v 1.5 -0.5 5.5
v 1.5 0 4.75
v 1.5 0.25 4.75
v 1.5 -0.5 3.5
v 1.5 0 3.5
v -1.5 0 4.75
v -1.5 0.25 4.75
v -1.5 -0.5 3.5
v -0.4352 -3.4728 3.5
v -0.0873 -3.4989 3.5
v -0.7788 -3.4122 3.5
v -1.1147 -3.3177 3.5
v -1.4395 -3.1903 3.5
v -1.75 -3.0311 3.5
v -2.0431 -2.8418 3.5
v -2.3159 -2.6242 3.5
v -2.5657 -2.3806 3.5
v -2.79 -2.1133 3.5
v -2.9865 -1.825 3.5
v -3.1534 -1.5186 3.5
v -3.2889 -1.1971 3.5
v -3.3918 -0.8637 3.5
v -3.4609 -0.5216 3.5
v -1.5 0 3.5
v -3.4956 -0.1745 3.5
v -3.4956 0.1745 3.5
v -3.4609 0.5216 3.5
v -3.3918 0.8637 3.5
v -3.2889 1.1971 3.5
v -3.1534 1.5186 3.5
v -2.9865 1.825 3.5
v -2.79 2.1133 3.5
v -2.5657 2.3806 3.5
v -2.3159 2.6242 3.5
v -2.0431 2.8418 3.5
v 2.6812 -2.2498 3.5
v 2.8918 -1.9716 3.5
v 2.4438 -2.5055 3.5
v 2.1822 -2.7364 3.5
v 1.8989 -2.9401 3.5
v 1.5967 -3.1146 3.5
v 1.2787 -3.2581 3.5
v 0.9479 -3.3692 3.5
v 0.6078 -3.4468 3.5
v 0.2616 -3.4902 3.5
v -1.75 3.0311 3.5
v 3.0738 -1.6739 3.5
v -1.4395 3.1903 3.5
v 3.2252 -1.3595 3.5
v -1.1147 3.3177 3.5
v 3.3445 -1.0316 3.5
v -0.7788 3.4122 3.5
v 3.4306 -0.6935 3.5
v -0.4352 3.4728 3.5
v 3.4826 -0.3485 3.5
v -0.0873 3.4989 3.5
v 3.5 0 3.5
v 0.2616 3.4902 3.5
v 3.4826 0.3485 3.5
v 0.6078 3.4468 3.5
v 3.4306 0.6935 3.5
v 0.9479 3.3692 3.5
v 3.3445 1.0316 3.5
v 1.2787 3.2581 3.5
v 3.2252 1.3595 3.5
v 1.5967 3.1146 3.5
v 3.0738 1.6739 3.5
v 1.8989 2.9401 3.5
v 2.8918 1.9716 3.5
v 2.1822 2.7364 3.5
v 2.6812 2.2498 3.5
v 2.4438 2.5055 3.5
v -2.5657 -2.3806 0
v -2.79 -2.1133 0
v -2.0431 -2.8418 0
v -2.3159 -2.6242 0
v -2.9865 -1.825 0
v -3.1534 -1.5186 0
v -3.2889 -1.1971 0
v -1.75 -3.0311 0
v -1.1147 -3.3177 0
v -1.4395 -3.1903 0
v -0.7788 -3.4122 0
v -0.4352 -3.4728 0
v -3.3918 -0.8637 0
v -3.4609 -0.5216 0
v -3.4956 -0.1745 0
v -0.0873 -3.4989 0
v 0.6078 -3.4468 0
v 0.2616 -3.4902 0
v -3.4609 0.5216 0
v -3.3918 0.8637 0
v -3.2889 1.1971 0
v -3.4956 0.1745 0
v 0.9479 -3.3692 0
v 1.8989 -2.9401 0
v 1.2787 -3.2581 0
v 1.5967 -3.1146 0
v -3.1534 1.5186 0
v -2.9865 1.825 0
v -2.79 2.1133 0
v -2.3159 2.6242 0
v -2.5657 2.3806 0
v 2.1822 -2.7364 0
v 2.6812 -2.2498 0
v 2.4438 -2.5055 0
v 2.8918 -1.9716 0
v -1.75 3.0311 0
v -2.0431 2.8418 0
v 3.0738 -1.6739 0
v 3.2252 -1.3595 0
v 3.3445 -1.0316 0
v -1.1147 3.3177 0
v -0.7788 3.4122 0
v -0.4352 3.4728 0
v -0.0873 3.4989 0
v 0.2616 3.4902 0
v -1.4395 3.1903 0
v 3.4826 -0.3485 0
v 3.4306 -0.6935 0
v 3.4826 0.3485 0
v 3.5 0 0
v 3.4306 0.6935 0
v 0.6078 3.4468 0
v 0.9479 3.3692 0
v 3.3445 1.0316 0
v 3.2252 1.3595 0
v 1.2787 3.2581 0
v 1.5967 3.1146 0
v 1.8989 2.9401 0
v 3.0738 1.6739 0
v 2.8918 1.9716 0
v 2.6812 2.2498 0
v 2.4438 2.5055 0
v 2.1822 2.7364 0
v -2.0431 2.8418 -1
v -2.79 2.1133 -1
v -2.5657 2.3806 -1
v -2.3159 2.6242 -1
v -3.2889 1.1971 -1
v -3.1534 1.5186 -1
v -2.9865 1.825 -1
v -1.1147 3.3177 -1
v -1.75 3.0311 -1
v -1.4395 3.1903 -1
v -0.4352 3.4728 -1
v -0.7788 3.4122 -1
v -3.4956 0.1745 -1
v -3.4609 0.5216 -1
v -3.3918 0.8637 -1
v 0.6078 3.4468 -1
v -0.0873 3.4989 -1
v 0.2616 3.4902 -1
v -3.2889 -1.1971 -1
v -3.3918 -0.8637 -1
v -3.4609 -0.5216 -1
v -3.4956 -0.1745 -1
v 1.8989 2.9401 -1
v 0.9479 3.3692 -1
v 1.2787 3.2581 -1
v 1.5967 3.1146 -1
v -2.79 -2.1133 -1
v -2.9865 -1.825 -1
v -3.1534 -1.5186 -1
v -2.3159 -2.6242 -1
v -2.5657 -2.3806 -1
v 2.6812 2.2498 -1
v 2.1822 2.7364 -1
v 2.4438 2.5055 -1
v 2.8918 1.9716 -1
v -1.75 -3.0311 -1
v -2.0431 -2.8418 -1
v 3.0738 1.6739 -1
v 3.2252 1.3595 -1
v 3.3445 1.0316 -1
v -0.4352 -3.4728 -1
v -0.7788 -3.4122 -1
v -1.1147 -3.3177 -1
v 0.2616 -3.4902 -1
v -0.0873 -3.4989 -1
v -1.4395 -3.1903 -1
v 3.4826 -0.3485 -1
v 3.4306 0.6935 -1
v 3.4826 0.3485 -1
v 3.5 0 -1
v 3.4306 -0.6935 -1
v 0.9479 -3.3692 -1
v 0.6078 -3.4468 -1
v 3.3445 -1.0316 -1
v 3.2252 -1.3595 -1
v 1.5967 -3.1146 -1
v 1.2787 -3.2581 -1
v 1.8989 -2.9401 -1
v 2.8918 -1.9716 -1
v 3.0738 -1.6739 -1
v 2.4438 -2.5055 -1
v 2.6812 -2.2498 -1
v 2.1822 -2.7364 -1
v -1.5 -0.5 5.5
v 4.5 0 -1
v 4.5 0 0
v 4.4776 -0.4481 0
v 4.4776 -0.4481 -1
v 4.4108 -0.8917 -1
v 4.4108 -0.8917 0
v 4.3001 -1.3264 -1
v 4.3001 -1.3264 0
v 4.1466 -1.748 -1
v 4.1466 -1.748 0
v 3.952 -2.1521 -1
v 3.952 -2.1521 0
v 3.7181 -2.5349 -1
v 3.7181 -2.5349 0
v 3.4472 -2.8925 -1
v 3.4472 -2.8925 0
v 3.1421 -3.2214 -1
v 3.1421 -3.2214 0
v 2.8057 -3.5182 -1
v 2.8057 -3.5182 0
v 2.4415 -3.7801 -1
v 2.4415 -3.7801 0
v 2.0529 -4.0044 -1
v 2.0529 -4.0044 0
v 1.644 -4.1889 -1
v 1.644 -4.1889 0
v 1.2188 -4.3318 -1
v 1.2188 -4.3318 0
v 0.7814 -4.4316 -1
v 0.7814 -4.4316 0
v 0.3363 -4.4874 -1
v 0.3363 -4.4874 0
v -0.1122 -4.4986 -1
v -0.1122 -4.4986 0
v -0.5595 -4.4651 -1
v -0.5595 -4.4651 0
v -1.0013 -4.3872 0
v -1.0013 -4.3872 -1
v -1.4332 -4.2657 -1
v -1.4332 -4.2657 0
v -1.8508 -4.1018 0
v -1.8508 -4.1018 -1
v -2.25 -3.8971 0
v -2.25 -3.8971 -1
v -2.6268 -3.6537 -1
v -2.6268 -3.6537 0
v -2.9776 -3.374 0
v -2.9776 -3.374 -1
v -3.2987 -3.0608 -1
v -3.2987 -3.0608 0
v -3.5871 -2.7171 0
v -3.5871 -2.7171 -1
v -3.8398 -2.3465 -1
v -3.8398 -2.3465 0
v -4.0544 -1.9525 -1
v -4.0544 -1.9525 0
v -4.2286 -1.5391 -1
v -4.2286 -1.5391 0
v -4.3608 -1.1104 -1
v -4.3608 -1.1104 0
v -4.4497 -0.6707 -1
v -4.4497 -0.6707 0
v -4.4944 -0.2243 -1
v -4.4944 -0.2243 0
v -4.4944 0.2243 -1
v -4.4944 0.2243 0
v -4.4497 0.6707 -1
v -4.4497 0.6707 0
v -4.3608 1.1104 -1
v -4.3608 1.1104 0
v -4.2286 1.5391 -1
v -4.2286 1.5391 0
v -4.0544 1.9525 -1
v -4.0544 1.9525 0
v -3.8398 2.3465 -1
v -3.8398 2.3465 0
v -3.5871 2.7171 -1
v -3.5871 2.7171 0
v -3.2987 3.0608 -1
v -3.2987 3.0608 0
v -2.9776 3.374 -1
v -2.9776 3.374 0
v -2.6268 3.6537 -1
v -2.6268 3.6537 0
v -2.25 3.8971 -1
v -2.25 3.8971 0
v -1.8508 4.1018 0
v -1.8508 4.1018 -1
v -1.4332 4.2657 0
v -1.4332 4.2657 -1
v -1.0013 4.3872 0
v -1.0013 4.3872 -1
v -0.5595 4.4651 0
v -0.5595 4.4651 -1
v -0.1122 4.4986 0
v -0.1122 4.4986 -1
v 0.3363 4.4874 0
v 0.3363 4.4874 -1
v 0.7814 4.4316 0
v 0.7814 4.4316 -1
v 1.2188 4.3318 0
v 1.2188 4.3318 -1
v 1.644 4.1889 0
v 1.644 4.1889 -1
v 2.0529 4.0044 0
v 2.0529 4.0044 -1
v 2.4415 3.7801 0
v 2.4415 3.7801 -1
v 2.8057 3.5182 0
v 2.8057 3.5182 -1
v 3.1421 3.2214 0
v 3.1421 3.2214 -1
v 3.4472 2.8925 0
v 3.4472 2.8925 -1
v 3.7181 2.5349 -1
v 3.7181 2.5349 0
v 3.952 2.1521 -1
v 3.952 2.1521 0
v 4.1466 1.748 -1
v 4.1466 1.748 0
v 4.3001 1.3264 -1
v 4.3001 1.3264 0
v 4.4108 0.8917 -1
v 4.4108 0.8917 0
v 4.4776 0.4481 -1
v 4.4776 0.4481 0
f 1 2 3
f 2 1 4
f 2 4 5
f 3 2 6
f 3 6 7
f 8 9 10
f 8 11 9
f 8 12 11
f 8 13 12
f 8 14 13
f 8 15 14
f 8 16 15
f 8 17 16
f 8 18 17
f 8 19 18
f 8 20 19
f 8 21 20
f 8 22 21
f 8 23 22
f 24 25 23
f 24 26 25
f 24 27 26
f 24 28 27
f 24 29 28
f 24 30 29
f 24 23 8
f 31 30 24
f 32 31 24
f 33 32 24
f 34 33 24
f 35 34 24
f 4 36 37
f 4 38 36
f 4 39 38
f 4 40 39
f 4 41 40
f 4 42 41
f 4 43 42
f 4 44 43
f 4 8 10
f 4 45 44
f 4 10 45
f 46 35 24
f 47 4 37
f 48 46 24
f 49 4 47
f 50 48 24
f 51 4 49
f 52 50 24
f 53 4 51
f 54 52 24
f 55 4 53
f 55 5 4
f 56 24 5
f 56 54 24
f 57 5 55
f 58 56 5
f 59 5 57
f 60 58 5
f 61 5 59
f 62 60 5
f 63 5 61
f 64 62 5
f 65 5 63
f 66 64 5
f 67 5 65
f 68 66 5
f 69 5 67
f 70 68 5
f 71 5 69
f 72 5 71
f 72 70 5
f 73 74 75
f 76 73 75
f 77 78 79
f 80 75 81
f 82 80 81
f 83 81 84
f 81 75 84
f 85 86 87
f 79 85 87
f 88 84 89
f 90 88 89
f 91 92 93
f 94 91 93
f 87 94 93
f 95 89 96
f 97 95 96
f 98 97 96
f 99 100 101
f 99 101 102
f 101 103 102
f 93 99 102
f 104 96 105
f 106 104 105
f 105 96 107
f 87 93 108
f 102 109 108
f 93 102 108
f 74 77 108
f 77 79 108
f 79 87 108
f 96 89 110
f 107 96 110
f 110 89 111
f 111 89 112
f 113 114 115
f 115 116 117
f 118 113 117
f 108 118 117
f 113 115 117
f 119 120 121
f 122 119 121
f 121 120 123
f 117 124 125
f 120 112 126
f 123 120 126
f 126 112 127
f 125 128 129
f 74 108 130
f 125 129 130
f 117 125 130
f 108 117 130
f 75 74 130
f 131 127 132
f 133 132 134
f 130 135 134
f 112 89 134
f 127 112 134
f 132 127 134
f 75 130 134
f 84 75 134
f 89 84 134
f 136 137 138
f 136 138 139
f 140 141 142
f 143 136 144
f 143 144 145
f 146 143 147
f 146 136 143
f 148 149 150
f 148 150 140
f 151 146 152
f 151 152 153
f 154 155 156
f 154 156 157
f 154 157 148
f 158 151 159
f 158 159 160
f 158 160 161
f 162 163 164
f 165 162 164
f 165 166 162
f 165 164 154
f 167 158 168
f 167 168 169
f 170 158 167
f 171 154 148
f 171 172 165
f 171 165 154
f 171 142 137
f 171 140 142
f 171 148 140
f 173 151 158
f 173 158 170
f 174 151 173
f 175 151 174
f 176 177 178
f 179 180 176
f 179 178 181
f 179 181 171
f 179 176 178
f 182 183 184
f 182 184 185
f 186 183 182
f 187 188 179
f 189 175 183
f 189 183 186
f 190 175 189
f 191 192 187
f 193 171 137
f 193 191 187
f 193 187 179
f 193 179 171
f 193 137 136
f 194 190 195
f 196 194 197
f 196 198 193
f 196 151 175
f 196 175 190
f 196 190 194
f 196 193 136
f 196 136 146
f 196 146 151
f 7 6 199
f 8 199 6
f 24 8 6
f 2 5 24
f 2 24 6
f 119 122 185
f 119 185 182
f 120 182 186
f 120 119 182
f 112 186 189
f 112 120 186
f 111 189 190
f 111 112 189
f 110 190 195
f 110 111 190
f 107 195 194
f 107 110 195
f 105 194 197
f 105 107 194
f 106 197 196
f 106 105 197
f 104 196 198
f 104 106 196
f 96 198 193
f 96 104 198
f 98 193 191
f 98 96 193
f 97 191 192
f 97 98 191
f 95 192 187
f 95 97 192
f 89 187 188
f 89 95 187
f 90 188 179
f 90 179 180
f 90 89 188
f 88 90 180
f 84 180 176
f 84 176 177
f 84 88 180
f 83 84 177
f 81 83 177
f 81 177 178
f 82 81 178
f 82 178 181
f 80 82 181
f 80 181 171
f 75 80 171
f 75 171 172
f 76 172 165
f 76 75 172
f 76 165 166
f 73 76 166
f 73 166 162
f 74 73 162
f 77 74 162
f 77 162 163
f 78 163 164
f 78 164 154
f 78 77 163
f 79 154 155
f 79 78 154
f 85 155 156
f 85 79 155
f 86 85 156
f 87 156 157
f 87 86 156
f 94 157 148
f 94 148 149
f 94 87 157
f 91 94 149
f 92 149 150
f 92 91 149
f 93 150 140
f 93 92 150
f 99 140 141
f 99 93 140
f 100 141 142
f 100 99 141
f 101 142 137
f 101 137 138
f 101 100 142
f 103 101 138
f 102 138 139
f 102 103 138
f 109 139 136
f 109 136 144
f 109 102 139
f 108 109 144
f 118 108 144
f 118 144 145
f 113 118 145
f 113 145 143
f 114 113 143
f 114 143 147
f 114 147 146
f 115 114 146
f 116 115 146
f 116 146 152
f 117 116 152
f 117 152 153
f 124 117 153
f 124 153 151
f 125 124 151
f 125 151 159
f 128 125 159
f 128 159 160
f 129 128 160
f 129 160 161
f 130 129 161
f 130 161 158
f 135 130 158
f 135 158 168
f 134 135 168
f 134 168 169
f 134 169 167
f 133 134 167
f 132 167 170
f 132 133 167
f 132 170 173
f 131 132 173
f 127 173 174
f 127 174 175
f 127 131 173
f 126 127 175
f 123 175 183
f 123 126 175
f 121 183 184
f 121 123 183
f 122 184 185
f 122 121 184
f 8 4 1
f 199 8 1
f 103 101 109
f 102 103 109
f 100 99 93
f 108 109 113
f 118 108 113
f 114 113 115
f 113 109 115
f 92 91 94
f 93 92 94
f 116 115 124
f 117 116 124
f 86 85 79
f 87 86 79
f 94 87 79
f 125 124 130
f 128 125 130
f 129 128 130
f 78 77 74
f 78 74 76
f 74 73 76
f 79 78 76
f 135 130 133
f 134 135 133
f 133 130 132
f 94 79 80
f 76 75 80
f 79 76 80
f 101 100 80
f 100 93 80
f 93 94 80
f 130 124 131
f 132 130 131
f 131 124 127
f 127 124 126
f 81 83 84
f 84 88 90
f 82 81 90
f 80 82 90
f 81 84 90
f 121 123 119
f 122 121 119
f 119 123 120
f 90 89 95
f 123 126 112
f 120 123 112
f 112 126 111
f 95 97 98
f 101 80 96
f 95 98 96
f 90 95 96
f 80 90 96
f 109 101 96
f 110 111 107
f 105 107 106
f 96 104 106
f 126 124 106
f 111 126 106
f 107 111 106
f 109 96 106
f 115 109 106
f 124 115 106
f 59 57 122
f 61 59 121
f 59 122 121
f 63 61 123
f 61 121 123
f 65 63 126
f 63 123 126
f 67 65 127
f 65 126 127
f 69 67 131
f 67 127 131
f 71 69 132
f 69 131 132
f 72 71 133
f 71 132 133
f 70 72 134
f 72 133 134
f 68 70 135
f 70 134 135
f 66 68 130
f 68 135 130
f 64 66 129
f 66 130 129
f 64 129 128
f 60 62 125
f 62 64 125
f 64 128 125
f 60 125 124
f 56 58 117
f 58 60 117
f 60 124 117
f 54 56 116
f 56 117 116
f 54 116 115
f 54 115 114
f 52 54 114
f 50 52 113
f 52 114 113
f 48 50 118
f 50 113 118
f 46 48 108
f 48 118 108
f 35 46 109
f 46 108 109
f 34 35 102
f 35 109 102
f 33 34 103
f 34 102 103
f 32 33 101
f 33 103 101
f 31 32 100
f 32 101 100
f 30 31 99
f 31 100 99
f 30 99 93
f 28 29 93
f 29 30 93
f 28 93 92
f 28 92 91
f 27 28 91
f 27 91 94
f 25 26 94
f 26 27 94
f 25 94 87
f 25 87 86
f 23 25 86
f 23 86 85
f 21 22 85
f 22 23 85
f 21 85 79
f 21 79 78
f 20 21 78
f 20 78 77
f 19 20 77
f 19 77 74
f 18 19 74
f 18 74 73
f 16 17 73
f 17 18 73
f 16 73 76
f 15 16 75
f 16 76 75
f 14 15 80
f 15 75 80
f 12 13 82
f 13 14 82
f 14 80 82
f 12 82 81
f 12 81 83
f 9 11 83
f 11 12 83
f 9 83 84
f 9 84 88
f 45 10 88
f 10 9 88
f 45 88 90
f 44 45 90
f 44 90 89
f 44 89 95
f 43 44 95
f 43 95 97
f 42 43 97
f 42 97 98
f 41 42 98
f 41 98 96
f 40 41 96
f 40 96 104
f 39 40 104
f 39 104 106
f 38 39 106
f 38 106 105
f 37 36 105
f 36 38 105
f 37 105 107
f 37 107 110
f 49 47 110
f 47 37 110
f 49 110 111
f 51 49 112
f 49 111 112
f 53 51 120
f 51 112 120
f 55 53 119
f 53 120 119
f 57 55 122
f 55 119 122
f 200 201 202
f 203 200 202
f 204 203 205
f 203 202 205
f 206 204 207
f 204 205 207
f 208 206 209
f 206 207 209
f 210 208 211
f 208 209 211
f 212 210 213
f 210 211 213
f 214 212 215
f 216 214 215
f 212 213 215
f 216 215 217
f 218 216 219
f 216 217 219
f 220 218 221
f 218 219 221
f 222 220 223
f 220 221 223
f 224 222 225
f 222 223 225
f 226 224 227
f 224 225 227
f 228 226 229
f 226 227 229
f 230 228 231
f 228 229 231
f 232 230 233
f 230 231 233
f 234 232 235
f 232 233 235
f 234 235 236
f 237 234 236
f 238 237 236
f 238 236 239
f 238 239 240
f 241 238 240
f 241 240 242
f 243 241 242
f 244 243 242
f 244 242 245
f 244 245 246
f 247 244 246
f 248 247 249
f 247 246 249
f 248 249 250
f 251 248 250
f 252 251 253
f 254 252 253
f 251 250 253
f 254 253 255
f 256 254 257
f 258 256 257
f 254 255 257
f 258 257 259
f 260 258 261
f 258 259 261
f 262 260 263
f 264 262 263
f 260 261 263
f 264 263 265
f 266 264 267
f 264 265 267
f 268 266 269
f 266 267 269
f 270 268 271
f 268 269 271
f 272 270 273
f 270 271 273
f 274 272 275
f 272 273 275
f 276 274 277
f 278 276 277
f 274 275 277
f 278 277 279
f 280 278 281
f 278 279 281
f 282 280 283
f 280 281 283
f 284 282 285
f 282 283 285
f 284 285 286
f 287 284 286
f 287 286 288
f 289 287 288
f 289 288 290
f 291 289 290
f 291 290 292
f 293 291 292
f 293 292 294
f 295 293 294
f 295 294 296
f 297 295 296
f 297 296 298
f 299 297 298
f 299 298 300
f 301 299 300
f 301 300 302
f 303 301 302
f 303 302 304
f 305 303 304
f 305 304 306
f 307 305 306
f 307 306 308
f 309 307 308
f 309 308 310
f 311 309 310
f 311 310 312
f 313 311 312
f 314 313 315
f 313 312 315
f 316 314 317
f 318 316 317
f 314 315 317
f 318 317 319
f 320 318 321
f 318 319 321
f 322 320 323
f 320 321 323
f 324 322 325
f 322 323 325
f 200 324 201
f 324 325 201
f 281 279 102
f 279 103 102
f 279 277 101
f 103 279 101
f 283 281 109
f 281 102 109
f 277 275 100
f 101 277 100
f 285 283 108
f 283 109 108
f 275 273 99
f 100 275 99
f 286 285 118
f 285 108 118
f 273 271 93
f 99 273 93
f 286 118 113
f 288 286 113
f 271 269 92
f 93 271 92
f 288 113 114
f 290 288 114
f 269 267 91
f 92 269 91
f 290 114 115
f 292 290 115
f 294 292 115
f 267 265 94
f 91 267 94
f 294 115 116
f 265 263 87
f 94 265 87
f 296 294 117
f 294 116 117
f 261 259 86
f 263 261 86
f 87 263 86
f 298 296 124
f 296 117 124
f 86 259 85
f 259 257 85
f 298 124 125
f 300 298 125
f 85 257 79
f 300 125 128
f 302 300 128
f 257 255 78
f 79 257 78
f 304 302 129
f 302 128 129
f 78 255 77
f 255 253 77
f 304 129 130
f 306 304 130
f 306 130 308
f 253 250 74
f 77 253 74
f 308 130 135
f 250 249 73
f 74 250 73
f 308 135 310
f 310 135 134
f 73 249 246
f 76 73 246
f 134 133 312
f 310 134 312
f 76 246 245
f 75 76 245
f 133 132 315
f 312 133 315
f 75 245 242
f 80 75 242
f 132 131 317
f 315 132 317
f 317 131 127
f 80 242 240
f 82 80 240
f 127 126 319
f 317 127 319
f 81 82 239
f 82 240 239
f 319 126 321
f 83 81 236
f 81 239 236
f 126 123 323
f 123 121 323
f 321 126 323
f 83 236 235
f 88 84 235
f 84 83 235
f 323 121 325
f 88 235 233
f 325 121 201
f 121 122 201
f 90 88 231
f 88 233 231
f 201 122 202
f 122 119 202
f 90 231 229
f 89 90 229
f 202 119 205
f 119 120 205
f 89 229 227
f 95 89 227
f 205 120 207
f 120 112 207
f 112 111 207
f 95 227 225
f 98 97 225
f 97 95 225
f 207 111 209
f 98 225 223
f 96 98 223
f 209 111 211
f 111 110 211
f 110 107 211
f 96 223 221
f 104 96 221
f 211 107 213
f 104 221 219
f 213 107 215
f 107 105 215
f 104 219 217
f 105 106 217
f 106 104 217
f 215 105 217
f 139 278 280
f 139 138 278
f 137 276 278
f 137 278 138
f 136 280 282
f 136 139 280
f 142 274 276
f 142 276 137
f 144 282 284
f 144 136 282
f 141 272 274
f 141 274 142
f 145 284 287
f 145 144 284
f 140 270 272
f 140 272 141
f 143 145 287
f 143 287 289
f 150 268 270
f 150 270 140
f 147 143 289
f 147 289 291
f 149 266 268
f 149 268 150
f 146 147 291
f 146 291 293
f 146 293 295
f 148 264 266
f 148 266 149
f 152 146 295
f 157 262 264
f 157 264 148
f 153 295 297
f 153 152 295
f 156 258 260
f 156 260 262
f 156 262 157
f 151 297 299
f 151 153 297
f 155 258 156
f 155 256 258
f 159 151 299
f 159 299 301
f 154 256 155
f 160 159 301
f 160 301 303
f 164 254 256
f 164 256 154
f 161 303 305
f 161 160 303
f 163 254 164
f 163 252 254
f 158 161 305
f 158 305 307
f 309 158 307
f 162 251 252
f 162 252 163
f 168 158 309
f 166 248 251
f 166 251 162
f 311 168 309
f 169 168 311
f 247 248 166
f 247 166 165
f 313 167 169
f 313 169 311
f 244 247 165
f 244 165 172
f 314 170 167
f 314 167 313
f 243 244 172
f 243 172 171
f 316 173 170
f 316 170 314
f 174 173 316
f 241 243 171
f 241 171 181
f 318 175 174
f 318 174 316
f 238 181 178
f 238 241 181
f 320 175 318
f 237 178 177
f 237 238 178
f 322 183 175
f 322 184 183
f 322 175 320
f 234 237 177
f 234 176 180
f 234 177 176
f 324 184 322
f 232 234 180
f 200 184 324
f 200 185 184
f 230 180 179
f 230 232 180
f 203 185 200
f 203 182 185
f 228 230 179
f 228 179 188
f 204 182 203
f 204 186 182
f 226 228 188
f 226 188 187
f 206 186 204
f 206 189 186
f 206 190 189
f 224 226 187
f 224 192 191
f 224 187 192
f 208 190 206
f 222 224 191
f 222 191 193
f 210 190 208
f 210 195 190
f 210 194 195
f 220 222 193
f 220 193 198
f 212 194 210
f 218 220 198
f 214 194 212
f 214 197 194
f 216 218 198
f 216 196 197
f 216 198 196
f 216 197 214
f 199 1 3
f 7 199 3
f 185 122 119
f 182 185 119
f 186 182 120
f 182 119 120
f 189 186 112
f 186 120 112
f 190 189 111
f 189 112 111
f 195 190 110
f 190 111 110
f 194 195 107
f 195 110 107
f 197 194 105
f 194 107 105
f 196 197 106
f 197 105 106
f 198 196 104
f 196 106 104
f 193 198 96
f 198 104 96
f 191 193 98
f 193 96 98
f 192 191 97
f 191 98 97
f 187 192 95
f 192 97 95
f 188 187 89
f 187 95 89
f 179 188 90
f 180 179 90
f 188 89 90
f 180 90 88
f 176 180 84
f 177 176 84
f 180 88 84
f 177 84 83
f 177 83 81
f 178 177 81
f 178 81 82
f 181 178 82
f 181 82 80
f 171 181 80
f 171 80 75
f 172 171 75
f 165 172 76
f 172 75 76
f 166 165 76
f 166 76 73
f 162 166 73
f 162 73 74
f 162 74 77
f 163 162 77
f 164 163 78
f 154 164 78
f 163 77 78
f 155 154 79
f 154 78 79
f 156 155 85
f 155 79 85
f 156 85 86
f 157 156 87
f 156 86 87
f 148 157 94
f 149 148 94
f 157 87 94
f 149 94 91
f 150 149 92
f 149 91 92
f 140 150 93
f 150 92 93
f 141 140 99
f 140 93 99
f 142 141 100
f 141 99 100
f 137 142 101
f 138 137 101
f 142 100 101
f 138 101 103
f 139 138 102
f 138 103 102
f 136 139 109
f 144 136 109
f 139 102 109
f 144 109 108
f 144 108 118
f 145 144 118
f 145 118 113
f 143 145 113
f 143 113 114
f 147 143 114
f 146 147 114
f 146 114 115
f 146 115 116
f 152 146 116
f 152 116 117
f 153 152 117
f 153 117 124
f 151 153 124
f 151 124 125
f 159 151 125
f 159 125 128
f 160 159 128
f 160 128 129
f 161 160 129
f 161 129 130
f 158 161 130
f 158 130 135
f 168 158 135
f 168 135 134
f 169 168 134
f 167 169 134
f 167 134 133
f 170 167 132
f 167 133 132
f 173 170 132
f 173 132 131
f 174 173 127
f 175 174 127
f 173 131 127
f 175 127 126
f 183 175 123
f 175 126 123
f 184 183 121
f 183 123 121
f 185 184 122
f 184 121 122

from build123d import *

# Parameters (mm, degrees)
F0_R     = 3.5
F1_DEPTH = 3.5
F2_R     = 4.5
F2_R_2   = 3.5
F3_DEPTH = 1
F4_R     = 3.5
F5_DEPTH = 1
F6_W     = 3
F6_H     = 3
F7_DEPTH = 2
F8_W     = 0.25
F8_H     = 1.25
F8_W_2   = 1
F8_H_2   = 2
F9_DEPTH = 25.4


with BuildPart() as f1:
    # F0 (on Top) → F1 (new body)
    with BuildSketch(Plane.XY):
        Circle(F0_R)
    extrude(amount=F1_DEPTH)

    # F6 (on face) → F7 (join)
    with BuildSketch(Plane.XY.offset(3.5)):
        Rectangle(F6_W, F6_H)
    extrude(amount=F7_DEPTH)

    # F8 (on face) → F9 (cut)
    with BuildSketch(Plane.YZ.offset(1.5)):
        with Locations((0.125, 4.125)):
            Rectangle(F8_W, F8_H)
        Polygon((0.25, 5.5), (0, 5.5), (0, 5), (0.25, 4.75), align=None)
        Polygon((0, 5.5), (-0.5, 5.5), (0, 5), align=None)
        with Locations((-1, 4.5)):
            Rectangle(F8_W_2, F8_H_2)
        Polygon((0.25, 4.75), (0.25, 3.5), (1.5, 3.5), (1.5, 5.5), (0.25, 5.5), align=None)
    extrude(amount=-F9_DEPTH, mode=Mode.SUBTRACT)


with BuildPart() as f3:
    # F2 (on face) → F3 (new body)
    with BuildSketch(Plane(origin=(0, 0, 0), x_dir=(1, 0, 0), z_dir=(0, 0, -1))):
        Circle(F2_R)
        Circle(F2_R_2, mode=Mode.SUBTRACT)
    extrude(amount=F3_DEPTH)


with BuildPart() as f5:
    # F4 (on face) → F5 (new body)
    with BuildSketch(Plane(origin=(0, 0, 0), x_dir=(1, 0, 0), z_dir=(0, 0, -1))):
        Circle(F4_R)
    extrude(amount=F5_DEPTH)


solid = Compound([f1.part, f3.part, f5.part])
